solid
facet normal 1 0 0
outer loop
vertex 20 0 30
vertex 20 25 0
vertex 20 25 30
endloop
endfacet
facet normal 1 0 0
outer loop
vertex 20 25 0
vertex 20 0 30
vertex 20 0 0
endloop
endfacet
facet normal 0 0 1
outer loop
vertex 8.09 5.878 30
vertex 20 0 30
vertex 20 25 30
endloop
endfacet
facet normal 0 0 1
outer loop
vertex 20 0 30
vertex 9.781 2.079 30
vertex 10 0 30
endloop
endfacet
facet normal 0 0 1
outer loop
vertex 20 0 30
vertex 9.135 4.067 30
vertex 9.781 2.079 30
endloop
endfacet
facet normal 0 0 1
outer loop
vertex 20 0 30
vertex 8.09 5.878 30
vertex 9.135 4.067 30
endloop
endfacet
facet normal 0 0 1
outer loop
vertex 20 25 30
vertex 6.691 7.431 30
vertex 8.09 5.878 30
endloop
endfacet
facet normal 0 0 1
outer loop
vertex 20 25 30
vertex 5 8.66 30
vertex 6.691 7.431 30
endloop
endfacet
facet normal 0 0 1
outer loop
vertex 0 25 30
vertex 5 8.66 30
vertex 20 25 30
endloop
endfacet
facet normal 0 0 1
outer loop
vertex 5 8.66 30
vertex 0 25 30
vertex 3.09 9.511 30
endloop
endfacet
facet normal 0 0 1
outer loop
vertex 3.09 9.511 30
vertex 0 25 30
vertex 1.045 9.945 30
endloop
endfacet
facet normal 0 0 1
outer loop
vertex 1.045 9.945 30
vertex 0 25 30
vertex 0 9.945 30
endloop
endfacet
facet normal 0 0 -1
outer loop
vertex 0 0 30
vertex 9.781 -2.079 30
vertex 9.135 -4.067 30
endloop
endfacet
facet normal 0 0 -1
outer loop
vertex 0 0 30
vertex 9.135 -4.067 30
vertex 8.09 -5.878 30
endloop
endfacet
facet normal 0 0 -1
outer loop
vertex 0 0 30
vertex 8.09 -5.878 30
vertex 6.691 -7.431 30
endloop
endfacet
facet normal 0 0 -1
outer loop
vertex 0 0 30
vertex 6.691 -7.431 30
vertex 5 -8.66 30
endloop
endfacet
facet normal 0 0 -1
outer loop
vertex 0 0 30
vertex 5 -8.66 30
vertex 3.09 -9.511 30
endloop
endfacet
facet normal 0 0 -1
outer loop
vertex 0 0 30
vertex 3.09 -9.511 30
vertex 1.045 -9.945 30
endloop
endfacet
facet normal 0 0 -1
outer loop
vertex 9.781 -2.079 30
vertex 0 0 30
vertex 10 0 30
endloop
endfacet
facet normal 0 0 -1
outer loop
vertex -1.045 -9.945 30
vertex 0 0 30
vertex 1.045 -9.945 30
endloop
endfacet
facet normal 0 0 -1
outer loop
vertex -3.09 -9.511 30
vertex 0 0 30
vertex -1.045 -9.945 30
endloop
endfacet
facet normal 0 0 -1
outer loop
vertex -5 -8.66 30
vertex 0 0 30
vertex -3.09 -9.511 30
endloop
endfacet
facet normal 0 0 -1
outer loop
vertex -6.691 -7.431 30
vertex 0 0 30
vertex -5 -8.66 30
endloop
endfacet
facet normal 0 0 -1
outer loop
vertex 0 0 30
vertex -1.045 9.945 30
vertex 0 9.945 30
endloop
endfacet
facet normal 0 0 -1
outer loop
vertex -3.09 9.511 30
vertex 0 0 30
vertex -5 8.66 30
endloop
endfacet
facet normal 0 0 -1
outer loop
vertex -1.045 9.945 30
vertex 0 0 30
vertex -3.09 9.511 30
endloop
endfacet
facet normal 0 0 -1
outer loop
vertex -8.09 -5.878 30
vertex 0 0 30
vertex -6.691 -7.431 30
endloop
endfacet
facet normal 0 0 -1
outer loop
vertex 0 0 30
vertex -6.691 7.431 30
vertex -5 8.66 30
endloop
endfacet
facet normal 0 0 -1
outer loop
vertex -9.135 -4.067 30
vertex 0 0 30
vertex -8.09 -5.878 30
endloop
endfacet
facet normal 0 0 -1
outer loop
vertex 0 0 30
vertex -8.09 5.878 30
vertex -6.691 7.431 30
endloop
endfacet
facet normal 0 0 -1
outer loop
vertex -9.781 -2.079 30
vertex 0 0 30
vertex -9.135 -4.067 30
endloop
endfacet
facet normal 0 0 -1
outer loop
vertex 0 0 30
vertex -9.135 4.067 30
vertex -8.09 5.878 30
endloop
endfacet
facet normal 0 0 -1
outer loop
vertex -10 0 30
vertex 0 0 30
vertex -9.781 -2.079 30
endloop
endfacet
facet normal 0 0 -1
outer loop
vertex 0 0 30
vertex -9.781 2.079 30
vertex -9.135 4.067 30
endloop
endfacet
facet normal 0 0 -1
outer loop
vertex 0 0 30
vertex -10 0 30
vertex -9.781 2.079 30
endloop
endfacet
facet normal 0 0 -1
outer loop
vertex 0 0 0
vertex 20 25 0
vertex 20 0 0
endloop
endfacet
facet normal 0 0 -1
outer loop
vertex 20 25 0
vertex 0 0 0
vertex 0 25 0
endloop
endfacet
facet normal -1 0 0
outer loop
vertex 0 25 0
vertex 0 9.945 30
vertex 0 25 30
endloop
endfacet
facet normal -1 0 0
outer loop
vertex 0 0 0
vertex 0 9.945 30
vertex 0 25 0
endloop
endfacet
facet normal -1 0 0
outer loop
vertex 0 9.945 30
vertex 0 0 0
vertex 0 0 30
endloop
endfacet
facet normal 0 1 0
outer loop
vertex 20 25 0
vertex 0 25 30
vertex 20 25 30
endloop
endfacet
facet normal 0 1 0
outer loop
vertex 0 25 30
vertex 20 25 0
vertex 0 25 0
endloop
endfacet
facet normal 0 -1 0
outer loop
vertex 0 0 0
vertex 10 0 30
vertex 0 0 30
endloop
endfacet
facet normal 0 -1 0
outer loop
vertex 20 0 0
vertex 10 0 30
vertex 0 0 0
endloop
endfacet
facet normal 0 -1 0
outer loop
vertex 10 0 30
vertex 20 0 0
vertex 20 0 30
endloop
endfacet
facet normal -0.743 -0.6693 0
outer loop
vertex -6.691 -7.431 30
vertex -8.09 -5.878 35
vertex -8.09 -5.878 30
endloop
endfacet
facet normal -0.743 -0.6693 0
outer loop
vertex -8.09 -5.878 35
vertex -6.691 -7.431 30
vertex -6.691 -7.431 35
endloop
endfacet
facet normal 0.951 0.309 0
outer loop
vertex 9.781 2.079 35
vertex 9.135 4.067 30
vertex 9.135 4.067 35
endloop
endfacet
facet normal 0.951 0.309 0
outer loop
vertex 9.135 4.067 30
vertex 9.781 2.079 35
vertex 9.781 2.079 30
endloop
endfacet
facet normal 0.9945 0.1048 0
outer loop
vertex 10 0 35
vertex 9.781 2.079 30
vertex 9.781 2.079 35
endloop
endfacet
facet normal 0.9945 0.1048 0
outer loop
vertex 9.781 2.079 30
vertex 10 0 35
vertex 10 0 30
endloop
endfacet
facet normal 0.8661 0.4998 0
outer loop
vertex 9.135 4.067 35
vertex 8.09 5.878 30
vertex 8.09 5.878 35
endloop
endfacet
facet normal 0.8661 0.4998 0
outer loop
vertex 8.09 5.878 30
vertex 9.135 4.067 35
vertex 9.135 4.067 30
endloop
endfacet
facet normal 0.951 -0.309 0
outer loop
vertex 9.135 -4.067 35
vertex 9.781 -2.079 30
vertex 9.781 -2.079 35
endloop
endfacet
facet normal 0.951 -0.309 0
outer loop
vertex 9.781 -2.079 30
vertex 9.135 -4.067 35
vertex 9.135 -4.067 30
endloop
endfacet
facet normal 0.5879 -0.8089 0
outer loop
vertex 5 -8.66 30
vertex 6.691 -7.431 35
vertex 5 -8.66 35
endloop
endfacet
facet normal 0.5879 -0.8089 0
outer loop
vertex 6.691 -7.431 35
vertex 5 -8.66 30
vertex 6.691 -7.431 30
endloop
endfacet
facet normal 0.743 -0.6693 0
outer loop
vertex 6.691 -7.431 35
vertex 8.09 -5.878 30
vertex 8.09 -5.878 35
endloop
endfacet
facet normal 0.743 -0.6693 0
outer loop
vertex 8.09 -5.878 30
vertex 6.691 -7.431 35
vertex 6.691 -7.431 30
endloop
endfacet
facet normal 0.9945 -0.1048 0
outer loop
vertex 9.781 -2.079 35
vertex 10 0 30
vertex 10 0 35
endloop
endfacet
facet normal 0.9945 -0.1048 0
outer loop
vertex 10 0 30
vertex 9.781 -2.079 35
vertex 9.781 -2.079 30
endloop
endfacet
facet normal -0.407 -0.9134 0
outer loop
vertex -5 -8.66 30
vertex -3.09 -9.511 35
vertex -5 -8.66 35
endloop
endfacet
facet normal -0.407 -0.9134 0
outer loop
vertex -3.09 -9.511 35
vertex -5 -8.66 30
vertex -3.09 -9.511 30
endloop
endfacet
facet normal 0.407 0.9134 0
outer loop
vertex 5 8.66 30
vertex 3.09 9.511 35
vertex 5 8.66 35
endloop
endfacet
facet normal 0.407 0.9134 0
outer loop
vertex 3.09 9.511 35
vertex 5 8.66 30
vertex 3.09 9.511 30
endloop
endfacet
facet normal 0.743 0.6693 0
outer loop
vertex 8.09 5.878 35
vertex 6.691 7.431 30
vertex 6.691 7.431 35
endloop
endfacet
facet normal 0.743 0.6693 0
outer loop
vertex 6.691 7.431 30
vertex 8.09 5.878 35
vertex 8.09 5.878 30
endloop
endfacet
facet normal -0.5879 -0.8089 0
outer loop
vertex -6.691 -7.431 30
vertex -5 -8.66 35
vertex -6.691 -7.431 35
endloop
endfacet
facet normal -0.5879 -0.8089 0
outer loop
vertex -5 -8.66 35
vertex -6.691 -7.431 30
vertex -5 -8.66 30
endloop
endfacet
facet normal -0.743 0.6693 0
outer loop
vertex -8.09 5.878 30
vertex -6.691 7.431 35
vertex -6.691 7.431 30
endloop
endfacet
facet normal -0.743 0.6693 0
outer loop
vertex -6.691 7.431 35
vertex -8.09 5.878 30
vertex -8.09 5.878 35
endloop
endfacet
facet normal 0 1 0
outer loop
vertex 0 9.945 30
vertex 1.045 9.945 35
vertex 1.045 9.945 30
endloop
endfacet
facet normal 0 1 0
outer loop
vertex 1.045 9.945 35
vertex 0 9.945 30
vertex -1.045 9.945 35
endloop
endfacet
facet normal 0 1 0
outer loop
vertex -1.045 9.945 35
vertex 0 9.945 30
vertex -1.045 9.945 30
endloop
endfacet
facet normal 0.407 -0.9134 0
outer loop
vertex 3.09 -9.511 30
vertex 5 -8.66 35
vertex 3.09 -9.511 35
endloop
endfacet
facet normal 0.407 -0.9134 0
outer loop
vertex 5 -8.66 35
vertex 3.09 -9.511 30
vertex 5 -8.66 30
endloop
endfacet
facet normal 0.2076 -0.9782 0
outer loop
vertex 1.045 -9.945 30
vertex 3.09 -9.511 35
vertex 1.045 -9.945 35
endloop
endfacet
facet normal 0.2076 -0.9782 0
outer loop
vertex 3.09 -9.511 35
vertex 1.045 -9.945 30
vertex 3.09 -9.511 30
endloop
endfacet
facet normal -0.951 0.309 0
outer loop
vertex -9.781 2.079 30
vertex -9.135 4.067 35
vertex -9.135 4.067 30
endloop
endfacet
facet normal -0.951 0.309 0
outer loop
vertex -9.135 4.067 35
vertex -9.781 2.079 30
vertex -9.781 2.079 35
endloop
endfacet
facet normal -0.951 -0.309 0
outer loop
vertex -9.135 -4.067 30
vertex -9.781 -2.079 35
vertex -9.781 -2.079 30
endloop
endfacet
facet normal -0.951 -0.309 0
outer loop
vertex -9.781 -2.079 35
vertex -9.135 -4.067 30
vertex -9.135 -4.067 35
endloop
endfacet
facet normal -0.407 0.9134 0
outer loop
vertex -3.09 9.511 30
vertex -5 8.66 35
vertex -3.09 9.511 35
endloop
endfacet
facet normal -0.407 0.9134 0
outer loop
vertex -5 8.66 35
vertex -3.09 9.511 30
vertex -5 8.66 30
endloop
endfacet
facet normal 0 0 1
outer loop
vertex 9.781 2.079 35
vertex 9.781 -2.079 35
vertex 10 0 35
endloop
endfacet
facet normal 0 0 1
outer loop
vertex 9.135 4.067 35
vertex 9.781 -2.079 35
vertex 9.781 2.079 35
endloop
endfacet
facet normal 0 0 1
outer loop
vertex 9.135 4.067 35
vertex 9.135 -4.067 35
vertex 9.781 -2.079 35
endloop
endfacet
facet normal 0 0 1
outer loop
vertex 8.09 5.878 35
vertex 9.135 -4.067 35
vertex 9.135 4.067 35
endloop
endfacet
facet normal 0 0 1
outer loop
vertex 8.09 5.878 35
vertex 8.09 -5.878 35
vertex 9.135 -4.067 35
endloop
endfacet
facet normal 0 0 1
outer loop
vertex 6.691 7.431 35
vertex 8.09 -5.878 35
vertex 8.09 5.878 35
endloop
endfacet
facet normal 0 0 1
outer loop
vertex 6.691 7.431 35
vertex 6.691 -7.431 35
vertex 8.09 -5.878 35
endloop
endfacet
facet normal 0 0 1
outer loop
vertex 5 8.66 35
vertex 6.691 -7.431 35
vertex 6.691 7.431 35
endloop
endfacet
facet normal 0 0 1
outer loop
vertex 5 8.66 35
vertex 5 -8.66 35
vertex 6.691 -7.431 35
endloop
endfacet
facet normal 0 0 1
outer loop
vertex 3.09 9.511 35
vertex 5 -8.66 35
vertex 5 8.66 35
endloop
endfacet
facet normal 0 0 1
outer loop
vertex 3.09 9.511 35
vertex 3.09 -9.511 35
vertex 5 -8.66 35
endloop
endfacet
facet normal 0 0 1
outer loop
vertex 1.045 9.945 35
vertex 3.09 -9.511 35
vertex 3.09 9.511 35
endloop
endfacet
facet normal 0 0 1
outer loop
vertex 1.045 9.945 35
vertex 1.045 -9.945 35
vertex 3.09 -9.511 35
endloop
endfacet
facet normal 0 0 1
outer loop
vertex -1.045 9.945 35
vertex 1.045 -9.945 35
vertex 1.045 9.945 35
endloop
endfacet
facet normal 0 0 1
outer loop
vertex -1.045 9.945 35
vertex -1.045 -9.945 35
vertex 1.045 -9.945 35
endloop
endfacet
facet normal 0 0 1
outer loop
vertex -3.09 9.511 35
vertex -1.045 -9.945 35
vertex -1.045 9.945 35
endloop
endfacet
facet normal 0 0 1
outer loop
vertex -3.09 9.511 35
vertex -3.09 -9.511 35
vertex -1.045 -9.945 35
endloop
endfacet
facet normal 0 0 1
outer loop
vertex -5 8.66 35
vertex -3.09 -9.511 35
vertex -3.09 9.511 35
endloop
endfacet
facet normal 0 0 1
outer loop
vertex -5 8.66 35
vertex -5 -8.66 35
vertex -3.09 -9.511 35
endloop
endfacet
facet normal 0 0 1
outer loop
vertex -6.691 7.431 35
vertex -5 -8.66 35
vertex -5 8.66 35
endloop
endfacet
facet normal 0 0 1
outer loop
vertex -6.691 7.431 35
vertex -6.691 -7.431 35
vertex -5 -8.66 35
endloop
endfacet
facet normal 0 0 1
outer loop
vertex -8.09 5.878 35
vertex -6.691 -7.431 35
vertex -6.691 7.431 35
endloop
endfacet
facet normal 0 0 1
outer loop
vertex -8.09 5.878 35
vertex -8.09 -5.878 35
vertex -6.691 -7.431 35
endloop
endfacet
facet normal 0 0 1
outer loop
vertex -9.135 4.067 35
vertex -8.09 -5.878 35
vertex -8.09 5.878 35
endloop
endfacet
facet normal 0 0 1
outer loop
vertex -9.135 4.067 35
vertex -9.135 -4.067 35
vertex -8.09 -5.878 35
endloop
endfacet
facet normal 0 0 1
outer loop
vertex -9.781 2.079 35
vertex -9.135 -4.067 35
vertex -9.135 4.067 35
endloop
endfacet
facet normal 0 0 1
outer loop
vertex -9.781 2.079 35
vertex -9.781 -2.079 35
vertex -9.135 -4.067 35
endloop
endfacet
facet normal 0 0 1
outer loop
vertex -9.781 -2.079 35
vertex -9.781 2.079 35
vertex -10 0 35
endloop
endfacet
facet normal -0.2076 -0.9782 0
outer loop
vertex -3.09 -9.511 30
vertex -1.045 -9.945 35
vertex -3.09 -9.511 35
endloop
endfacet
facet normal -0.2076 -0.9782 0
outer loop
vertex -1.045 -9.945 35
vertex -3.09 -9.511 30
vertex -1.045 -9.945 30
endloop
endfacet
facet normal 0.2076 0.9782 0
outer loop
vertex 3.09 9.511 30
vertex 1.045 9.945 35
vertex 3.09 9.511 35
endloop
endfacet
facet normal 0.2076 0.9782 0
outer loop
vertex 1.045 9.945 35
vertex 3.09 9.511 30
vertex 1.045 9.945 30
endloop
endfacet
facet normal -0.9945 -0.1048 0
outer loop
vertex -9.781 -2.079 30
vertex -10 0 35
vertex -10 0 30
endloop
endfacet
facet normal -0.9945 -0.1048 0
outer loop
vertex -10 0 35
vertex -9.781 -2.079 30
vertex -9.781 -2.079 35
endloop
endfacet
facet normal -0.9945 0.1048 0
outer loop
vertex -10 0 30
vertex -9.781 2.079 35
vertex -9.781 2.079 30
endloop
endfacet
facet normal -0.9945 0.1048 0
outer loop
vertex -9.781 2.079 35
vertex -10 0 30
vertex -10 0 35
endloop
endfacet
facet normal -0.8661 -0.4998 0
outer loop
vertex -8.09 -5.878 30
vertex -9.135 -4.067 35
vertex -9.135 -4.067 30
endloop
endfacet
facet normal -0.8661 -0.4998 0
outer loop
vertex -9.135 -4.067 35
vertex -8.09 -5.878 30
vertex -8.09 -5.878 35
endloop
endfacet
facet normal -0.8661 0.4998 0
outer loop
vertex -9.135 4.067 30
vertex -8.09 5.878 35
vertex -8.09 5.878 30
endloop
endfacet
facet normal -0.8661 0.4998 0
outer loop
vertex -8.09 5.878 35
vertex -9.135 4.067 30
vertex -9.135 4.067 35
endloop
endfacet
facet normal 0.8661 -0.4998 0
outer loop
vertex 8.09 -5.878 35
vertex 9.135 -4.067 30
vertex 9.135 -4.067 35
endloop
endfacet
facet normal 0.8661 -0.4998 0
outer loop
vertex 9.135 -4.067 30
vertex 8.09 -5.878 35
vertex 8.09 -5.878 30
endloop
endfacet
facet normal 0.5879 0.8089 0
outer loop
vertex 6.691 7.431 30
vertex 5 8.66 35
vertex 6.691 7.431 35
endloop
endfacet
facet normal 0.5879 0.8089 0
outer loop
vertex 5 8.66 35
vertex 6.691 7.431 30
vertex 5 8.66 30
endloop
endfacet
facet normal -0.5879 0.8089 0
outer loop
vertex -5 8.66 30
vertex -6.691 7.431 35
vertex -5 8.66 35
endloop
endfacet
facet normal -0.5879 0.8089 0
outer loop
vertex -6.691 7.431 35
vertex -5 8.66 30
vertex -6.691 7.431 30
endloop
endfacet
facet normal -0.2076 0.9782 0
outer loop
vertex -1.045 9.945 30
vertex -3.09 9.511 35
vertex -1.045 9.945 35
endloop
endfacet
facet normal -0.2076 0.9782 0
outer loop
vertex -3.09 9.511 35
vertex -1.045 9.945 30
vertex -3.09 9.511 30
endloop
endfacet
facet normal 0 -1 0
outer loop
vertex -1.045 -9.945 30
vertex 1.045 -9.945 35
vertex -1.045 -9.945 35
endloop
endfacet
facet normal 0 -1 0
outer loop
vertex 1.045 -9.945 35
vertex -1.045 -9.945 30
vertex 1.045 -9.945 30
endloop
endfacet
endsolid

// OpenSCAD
// Parametric version of box-magic.scad using named parameters (positive target)
W = 20;
H = 25;
D = 30;

cube([W, H, D]);
translate([0, 0, D])
cylinder(h=5, d=W);
